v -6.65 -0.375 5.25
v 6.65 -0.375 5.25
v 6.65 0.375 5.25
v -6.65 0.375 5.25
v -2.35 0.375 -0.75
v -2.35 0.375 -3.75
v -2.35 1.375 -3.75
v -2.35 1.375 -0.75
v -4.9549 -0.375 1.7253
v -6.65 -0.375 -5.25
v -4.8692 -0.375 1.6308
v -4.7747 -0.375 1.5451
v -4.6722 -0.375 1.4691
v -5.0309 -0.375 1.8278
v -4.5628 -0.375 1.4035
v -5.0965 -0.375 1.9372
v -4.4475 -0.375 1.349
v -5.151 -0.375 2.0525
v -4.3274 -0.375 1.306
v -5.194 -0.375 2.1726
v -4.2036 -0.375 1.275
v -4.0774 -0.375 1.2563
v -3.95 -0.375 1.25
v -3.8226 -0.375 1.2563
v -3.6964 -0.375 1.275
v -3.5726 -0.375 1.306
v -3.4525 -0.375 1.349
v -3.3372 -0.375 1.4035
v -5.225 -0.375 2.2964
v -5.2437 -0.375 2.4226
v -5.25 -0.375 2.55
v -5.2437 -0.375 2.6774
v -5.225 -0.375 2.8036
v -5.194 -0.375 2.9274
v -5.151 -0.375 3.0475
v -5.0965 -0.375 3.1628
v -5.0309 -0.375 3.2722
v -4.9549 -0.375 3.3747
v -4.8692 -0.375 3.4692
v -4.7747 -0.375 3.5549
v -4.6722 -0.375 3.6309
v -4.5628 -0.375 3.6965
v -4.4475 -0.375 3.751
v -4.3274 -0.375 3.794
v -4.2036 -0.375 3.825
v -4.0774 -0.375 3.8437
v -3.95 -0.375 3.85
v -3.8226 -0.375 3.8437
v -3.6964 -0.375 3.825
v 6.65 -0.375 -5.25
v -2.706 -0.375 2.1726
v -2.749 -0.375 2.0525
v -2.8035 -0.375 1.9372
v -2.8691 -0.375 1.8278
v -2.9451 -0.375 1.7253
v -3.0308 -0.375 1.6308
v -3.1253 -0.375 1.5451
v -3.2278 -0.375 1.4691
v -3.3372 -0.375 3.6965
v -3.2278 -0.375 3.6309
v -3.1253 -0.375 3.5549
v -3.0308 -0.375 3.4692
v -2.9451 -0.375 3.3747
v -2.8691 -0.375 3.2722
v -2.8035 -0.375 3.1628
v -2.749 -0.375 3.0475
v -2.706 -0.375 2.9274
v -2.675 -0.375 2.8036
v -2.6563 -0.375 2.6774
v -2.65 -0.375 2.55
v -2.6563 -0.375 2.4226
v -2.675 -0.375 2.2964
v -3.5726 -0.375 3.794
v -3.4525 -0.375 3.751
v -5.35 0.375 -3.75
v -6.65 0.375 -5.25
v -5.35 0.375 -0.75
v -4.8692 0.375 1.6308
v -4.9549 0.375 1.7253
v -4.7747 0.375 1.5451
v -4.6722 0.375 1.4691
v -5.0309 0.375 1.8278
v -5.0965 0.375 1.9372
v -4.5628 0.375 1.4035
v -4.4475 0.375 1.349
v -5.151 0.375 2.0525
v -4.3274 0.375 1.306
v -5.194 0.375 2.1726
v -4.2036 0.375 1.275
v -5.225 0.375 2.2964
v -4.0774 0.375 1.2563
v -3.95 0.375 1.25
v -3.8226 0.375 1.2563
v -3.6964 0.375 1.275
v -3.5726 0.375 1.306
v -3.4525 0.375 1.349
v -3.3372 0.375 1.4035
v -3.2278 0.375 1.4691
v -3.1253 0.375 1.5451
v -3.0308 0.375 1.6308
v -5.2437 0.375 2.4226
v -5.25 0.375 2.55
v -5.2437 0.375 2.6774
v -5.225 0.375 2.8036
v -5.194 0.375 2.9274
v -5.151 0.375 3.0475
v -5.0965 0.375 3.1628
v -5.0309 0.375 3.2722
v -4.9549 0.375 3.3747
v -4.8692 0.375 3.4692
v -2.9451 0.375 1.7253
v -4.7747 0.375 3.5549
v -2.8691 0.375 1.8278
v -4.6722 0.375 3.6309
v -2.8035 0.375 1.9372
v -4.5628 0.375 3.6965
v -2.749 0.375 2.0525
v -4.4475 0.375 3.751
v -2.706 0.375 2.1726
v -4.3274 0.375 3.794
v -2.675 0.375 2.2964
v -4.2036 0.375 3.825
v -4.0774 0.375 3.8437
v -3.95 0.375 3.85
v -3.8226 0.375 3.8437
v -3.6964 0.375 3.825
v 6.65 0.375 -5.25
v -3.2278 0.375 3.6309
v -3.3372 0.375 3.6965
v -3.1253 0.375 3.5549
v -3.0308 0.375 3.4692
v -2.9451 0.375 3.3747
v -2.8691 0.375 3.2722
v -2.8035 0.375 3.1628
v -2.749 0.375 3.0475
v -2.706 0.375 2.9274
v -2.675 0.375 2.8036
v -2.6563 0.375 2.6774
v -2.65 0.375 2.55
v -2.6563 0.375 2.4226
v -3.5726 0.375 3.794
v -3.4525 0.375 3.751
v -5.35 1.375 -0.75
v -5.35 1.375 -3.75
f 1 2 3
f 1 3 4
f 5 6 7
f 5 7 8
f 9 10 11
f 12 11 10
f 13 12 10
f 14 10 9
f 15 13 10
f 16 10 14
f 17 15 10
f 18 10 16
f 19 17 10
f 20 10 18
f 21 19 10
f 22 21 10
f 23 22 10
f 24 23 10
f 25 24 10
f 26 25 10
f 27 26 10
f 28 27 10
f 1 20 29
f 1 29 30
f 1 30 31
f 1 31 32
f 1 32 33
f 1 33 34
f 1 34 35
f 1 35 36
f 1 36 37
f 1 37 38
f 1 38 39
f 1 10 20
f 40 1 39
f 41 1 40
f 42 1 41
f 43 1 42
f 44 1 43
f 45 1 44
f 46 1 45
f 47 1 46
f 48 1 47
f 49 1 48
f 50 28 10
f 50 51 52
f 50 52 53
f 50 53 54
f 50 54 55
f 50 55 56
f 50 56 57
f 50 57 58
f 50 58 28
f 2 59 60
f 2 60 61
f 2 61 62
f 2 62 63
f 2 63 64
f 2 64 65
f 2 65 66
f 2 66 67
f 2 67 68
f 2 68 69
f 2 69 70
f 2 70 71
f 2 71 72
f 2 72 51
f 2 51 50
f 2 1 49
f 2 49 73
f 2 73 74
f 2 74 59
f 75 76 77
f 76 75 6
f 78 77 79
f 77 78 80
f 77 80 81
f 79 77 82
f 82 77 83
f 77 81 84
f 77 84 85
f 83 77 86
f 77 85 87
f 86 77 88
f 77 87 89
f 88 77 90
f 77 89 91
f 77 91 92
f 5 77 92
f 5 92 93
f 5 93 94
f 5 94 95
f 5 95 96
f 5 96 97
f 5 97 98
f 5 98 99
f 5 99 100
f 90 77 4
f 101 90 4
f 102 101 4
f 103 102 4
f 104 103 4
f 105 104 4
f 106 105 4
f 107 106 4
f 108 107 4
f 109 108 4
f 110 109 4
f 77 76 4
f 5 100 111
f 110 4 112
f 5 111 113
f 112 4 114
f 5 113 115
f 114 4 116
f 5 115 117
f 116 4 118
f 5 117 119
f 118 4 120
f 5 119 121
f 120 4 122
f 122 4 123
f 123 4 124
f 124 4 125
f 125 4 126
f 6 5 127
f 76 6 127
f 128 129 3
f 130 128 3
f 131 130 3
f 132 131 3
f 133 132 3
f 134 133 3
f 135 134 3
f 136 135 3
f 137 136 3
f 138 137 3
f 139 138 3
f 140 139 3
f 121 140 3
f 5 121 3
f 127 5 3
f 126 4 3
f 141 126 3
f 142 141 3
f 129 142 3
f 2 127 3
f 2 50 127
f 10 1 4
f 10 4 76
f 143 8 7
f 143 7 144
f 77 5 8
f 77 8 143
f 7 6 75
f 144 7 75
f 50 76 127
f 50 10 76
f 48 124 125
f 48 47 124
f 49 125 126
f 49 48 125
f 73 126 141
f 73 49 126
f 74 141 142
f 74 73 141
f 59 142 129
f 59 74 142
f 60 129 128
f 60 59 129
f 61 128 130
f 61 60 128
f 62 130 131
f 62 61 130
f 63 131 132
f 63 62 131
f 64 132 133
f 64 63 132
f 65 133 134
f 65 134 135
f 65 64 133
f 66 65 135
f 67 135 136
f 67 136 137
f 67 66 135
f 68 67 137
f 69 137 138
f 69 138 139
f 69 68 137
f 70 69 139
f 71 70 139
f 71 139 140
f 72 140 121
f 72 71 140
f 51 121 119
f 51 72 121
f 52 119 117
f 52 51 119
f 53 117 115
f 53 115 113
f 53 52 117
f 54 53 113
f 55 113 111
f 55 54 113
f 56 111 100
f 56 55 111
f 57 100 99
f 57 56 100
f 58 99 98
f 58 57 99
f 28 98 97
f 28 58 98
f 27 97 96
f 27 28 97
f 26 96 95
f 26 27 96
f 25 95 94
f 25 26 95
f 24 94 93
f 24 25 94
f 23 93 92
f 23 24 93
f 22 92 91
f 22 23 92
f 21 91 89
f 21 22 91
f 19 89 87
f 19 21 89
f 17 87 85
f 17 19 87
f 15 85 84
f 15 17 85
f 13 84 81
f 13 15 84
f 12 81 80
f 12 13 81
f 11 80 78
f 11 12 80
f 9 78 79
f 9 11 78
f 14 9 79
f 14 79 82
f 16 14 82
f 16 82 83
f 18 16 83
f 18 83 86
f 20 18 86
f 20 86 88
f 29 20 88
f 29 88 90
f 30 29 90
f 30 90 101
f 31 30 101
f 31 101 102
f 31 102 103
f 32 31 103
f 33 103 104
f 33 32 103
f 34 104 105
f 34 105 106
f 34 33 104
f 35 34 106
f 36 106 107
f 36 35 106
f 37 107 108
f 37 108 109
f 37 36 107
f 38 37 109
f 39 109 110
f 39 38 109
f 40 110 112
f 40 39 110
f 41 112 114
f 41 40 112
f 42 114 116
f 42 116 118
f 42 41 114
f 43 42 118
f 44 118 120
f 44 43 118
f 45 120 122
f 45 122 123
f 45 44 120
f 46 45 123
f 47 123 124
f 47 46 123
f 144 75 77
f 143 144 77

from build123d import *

# Parameters (mm, degrees)
F1_DEPTH = 0.375
F2_W     = 3
F2_H     = 3
F3_DEPTH = 1


with BuildPart() as f1:
    # F0 (on Front) → F1 (new body, symmetric)
    with BuildSketch(Plane.XZ):
        Polygon((6.65, -5.25), (6.65, 5.25), (-3.95, 5.25), (-6.65, 5.25), (-6.65, -5.25), align=None)
        with BuildLine():
            ThreePointArc((-2.65, 2.55), (-4.869239, 1.630761), (-3.95, 3.85))
            ThreePointArc((-3.95, 3.85), (-3.030761, 3.469239), (-2.65, 2.55))
        make_face(mode=Mode.SUBTRACT)
    extrude(amount=F1_DEPTH, both=True)

    # F2 (on face) → F3 (join)
    with BuildSketch(Plane(origin=(0, 0.375, 0), x_dir=(-1, 0, 0), z_dir=(0, 1, 0))):
        with Locations((3.85, -2.25)):
            Rectangle(F2_W, F2_H)
    extrude(amount=F3_DEPTH)


solid = f1.part
